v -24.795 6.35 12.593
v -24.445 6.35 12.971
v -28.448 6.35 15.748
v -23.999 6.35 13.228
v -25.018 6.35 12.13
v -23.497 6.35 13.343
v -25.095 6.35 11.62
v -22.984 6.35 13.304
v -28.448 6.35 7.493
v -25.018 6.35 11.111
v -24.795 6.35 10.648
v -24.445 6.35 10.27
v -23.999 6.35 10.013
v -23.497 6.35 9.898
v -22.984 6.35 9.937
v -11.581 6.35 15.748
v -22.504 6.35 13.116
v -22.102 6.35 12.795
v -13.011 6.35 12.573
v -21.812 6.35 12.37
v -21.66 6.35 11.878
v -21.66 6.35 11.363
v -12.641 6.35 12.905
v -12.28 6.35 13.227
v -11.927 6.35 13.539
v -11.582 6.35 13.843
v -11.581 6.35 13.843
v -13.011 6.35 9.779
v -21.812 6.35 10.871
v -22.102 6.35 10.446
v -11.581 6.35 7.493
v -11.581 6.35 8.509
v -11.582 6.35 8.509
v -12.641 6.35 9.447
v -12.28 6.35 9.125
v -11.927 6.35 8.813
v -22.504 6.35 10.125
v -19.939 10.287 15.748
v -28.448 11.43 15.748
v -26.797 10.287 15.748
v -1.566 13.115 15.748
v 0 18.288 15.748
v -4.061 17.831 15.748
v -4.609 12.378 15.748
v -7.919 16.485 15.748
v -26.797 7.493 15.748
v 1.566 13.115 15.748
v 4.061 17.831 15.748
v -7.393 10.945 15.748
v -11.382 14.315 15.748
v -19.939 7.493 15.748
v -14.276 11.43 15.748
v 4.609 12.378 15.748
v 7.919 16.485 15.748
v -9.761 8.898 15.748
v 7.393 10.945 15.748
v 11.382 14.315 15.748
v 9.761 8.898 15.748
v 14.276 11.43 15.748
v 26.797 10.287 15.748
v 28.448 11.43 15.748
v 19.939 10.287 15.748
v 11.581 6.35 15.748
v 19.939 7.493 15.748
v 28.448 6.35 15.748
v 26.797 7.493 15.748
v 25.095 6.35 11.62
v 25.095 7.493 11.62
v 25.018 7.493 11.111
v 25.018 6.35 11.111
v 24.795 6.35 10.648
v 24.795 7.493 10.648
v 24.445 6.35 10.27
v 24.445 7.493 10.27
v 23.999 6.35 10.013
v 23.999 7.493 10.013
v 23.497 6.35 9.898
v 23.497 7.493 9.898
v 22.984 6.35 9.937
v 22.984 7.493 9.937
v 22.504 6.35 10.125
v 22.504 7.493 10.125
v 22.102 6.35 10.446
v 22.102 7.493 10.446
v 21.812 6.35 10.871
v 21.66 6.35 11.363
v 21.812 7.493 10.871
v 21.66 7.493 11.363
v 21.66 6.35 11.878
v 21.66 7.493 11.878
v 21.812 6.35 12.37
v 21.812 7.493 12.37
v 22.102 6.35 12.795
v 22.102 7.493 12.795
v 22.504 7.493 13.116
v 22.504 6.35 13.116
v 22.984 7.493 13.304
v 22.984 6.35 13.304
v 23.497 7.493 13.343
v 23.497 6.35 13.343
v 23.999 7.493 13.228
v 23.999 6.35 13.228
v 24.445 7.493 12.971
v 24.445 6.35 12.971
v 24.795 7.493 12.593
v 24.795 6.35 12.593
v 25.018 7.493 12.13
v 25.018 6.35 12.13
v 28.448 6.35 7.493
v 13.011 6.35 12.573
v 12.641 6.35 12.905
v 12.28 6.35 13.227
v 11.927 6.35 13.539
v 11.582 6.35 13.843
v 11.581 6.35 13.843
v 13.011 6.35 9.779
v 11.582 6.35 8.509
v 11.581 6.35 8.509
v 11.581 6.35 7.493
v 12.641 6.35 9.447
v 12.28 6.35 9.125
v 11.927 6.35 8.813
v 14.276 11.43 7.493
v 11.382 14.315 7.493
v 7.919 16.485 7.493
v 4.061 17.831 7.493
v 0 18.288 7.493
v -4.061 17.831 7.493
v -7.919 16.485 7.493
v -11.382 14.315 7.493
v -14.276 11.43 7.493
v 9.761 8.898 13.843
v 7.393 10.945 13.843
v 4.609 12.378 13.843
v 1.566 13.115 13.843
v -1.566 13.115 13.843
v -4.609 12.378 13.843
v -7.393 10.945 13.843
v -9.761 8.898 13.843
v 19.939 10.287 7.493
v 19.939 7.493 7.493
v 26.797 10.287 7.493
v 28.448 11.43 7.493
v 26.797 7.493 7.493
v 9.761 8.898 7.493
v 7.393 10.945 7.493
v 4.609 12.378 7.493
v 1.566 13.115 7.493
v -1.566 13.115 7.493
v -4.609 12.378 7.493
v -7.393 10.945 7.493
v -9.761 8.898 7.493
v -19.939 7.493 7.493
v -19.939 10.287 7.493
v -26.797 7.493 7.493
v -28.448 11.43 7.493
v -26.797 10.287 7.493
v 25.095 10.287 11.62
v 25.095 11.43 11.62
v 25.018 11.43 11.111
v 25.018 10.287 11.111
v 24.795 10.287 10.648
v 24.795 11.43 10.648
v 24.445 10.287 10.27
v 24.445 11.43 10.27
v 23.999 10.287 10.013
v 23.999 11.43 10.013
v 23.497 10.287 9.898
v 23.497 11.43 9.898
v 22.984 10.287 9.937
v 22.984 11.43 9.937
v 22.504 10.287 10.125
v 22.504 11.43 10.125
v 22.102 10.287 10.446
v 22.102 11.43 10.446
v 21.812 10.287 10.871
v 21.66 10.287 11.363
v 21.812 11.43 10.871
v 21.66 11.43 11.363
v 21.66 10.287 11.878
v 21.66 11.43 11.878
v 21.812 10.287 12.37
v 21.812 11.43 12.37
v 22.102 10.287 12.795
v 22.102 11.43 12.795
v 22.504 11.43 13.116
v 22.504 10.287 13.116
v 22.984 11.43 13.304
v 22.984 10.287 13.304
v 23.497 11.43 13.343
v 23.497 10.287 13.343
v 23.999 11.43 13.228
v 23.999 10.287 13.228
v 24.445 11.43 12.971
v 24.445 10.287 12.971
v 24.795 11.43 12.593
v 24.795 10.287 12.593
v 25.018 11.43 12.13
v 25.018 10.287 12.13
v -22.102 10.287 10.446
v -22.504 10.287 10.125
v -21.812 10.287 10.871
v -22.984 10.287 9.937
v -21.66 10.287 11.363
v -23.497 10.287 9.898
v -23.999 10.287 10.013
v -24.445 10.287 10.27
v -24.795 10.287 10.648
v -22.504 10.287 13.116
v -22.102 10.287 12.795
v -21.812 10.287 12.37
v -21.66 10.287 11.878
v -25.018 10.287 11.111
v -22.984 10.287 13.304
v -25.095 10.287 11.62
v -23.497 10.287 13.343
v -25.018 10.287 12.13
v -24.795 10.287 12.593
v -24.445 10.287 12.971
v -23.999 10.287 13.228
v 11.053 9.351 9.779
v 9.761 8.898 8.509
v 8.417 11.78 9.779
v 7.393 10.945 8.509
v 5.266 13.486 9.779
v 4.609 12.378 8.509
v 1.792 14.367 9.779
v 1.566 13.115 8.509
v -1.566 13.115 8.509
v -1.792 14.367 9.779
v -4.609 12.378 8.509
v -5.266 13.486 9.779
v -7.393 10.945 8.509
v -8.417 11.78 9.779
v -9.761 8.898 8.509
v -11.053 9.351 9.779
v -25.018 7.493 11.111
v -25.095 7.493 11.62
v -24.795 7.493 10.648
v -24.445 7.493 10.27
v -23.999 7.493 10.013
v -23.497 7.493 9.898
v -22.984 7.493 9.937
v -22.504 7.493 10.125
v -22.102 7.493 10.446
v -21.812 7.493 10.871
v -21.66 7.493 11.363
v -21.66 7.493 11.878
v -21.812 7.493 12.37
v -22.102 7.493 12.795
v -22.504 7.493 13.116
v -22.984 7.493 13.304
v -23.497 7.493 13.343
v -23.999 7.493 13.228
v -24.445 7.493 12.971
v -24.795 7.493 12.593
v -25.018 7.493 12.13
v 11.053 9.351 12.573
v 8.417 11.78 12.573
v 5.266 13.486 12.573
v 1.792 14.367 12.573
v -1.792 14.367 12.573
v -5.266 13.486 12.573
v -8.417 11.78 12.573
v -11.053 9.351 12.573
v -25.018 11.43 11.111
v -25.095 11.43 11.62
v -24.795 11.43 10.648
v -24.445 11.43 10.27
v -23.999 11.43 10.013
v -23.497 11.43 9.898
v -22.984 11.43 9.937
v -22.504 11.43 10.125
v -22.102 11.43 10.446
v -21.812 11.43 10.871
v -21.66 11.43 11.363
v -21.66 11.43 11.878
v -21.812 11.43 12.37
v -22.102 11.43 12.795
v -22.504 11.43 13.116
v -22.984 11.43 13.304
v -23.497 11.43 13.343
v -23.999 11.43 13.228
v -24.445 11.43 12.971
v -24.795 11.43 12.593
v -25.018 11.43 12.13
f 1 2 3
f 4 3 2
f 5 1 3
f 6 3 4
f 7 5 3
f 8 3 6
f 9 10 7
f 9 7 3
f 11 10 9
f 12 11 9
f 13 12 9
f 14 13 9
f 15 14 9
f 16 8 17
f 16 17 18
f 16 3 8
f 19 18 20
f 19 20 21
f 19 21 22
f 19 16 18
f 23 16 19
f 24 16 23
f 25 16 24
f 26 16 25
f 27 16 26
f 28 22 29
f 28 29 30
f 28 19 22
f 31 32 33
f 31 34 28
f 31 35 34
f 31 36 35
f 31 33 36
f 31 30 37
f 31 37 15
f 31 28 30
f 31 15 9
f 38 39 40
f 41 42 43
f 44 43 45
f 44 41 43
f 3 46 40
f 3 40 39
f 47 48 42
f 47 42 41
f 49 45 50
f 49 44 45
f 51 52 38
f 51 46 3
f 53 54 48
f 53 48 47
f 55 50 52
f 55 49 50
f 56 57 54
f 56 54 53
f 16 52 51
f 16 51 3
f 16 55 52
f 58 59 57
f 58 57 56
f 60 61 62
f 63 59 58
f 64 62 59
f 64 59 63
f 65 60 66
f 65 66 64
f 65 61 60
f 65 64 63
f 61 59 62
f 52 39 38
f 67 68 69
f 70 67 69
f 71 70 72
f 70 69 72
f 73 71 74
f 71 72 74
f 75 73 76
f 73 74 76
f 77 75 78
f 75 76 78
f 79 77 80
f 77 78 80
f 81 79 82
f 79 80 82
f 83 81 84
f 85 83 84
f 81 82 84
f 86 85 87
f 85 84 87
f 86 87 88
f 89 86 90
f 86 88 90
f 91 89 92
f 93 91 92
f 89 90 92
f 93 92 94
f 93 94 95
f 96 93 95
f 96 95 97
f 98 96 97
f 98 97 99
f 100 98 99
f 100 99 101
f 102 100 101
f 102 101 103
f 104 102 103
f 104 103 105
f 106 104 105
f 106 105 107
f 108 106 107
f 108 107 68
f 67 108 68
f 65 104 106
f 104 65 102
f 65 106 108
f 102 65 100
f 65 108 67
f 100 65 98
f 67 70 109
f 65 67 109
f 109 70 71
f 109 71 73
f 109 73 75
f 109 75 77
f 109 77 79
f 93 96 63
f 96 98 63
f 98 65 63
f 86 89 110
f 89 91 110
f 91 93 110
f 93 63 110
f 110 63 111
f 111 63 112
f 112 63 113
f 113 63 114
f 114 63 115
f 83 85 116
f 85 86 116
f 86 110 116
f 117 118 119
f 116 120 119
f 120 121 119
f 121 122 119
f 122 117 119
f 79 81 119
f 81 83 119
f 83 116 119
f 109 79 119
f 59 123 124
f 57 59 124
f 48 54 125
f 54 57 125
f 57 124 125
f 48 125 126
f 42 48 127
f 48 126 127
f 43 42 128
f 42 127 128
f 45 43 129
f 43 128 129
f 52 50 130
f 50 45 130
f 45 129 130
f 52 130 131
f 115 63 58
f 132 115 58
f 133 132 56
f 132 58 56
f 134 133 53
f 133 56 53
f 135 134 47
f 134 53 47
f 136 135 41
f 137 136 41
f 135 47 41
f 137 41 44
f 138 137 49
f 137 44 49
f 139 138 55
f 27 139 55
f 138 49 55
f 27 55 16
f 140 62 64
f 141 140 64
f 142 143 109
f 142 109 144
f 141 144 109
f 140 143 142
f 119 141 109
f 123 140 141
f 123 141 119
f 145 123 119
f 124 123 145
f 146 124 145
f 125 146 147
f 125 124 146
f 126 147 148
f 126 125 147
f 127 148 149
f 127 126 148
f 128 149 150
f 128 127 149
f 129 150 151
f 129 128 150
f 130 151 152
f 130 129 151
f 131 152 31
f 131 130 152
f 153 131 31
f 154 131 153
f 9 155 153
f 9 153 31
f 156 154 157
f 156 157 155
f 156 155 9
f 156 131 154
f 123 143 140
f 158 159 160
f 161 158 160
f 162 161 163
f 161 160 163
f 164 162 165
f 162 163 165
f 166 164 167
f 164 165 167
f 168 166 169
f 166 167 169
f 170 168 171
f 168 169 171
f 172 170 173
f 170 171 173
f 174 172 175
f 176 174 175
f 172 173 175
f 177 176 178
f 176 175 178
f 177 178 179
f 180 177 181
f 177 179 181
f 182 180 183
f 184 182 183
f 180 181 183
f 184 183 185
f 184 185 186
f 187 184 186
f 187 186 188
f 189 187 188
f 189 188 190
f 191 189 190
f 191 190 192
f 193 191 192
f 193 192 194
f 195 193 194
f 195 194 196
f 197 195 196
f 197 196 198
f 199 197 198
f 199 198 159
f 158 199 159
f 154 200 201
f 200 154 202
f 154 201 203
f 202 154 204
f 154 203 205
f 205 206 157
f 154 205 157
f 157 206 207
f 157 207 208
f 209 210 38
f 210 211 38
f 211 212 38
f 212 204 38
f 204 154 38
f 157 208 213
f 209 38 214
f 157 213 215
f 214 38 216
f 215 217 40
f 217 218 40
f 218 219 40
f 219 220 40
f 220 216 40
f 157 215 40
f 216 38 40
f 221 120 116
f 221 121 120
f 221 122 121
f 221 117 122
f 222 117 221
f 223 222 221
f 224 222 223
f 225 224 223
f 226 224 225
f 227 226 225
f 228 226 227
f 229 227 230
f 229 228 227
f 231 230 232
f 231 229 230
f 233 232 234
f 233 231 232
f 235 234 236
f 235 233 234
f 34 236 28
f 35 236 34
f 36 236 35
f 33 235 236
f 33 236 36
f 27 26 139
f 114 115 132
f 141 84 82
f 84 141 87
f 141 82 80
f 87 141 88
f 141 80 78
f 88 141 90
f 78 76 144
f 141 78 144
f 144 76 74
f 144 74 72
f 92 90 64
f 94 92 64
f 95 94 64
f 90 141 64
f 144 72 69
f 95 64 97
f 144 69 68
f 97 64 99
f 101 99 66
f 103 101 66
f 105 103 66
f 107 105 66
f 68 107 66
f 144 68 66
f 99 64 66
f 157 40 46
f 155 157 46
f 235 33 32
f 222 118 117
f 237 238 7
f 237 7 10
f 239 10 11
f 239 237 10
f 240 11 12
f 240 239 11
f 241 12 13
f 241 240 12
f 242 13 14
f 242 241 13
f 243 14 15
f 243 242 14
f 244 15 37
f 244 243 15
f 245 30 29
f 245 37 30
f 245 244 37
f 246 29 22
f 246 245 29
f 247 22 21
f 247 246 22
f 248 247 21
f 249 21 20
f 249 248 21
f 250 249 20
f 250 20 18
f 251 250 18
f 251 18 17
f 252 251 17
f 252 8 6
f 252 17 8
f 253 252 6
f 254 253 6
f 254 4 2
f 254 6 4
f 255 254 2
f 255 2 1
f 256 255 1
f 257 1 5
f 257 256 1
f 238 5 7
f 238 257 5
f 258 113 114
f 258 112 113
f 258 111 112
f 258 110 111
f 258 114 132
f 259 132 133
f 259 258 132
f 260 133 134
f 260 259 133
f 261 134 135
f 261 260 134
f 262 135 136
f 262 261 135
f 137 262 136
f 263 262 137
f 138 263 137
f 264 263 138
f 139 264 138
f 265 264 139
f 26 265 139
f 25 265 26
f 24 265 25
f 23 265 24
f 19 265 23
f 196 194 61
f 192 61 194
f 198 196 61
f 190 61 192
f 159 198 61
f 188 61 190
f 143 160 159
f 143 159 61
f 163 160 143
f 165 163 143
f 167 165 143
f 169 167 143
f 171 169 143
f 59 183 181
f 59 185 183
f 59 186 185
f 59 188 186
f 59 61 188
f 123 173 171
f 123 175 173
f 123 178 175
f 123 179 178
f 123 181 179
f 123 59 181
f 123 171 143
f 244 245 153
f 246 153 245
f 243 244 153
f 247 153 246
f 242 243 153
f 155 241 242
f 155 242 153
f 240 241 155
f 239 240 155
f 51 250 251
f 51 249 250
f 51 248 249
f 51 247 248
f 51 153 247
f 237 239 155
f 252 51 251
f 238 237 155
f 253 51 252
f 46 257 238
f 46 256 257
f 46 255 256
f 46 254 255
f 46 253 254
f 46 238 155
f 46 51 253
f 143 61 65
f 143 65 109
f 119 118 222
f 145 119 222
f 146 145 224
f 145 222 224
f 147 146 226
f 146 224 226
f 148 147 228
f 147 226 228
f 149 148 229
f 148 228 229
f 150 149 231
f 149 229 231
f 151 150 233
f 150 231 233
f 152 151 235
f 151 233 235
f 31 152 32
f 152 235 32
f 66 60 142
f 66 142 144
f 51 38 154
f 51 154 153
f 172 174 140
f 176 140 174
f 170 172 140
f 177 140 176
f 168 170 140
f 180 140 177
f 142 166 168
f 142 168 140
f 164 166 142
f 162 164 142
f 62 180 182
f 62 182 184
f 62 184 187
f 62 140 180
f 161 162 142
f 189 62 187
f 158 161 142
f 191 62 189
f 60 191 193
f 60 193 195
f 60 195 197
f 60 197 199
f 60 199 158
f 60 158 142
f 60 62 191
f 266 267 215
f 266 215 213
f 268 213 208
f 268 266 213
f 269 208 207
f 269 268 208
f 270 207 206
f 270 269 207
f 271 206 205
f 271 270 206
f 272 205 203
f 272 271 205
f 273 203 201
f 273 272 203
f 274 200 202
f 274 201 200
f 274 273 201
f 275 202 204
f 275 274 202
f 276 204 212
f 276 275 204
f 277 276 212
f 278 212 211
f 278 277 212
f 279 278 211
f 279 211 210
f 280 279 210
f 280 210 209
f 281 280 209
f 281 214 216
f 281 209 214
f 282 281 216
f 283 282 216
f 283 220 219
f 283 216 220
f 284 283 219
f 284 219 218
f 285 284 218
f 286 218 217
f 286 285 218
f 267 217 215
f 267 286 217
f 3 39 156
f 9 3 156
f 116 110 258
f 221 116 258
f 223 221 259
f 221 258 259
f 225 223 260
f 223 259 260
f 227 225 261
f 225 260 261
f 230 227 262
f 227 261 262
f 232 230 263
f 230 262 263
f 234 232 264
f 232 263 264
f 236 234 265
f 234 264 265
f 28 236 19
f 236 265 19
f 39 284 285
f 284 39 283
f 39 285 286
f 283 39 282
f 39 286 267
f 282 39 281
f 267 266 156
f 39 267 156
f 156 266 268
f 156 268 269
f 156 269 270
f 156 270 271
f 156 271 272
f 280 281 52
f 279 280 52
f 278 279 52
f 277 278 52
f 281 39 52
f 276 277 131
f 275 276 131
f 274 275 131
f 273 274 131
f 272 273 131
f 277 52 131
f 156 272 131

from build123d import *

# Parameters (mm, degrees)
SKETCH1_R                   = 18.288
BOSS_EXTRUDE1_DEPTH         = 19.05
SKETCH3_R                   = 13.208
CUT_EXTRUDE1_DEPTH          = 33.121712096
SKETCH15_W                  = 19.05
SKETCH15_H                  = 17.526
BOSS_EXTRUDE3_DEPTH         = 15.24
SKETCH16_W                  = 11.43
SKETCH16_H                  = 5.842
CUT_EXTRUDE4_DEPTH          = 39.82462909
CHAMFER1_SIZE               = 8.129699408
CHAMFER1_SIZE_2             = 5.08
F_1_4_CLEARANCE_HOLE1_D     = 6.7564
F_1_4_CLEARANCE_HOLE1_DEPTH = 3.448428068
SKETCH19_R                  = 18.288
SKETCH19_R_2                = 13.208
CUT_EXTRUDE5_DEPTH          = 0.762
CUT_EXTRUDE6_START          = -2.54
SKETCH20_R                  = 18.288
CUT_EXTRUDE6_DEPTH          = 2.54
SKETCH21_R                  = 18.288
CUT_EXTRUDE7_DEPTH          = 7.493
SKETCH22_W                  = 19.05
SKETCH22_H                  = 4.191
CUT_EXTRUDE8_DEPTH          = 42.148
SKETCH24_R                  = 14.478
CUT_EXTRUDE10_DEPTH         = 5.334
SKETCH25_W                  = 8.255
SKETCH25_H                  = 5.08
BOSS_EXTRUDE4_DEPTH         = 15.24
F_4_CLEARANCE_HOLE1_D       = 3.4544
SKETCH28_W                  = 6.858
SKETCH28_H                  = 2.794
CUT_EXTRUDE11_DEPTH         = 43.003222079
MIRROR3_COPY_1_SKETCH_W     = 6.858
MIRROR3_COPY_1_SKETCH_H     = 2.794
MIRROR3_COPY_1_DEPTH        = 43.003222079
SKETCH29_W                  = 78.170578527
SKETCH29_H                  = 29.425688311
CUT_EXTRUDE12_DEPTH         = 35.306
CHAMFER2_SIZE               = 1.27


# Some blends are built 0.0001 mm under size
with BuildPart() as part:
    # Sketch1 → Boss-Extrude1 (new body)
    with BuildSketch(Plane.XY):
        with Locations(Location((0, 0, 0), (0, 0, 180))):
            Circle(SKETCH1_R)
    extrude(amount=BOSS_EXTRUDE1_DEPTH)

    # Sketch3 → Cut-Extrude1 (cut, through all)
    with BuildSketch(Plane.XY.offset(19.05)):
        Circle(SKETCH3_R)
    extrude(amount=-CUT_EXTRUDE1_DEPTH, mode=Mode.SUBTRACT)

    # Sketch15 → Boss-Extrude3 (add)
    with BuildSketch(Plane(origin=(0, -13.716, 0), x_dir=(1, 0, 0), z_dir=(0, 1, 0))):
        with Locations((0, -9.525)):
            Rectangle(SKETCH15_W, SKETCH15_H)
    extrude(amount=-BOSS_EXTRUDE3_DEPTH)

    # Sketch16 → Cut-Extrude4 (cut, through all)
    with BuildSketch(Plane.XY.offset(18.288)):
        with Locations((0, -22.586571932)):
            Rectangle(SKETCH16_W, SKETCH16_H)
    extrude(amount=-CUT_EXTRUDE4_DEPTH, mode=Mode.SUBTRACT)

    # Chamfer1
    # the kernel refuses this chamfer: 8.129699408, 5.08 mm, written as the material it takes off along each edge
    with BuildSketch(Plane(origin=(-30.543101737, -28.956, 0.762), x_dir=(0, 0.9997899140358644, -0.020497019104217945), z_dir=(1, 0, 0))) as chamfer1_piece_1:
        Polygon((CHAMFER1_SIZE * 0.999789913978, CHAMFER1_SIZE * 0.020497019103), (-CHAMFER1_SIZE_2 * 0.0204970191042, CHAMFER1_SIZE_2 * 0.999789914036), (0, 0), align=None)
    extrude(amount=61.086203475, mode=Mode.SUBTRACT)

    # 1/4 Clearance Hole1
    with Locations(Plane(origin=(0, -28.956, 0), x_dir=(-1, 0, 0), z_dir=(0, -1, 0))):
        with Locations((0, -12.021417661)):
            Hole(F_1_4_CLEARANCE_HOLE1_D / 2, depth=F_1_4_CLEARANCE_HOLE1_DEPTH)

    # Sketch19 → Cut-Extrude5 (cut)
    with BuildSketch(Plane.XY.offset(19.05)):
        with Locations(Location((0, 0, 0), (0, 0, 238.611833536))):
            Circle(SKETCH19_R)
        Circle(SKETCH19_R_2, mode=Mode.SUBTRACT)
    extrude(amount=-CUT_EXTRUDE5_DEPTH, mode=Mode.SUBTRACT)

    # Sketch20 → Cut-Extrude6 (cut)
    with BuildSketch(Plane.XY.offset(18.288).offset(CUT_EXTRUDE6_START)):
        with Locations(Location((0, 0, 0), (0, 0, 238.611833536))):
            Circle(SKETCH20_R)
    extrude(amount=CUT_EXTRUDE6_DEPTH, mode=Mode.SUBTRACT)

    # Sketch21 → Cut-Extrude7 (cut)
    with BuildSketch(Plane(origin=(0, 0, 0), x_dir=(-1, 0, 0), z_dir=(0, 0, -1))):
        Circle(SKETCH21_R)
    extrude(amount=-CUT_EXTRUDE7_DEPTH, mode=Mode.SUBTRACT)

    # Sketch22 → Cut-Extrude8 (cut, through all)
    with BuildSketch(Plane(origin=(0, -13.716, 0), x_dir=(1, 0, 0), z_dir=(0, 1, 0))):
        with Locations((0, -2.8575)):
            Rectangle(SKETCH22_W, SKETCH22_H)
    extrude(amount=-CUT_EXTRUDE8_DEPTH, mode=Mode.SUBTRACT)

    # Sketch24 → Cut-Extrude10 (cut)
    with BuildSketch(Plane.XY.offset(13.843)):
        Circle(SKETCH24_R)
    extrude(amount=-CUT_EXTRUDE10_DEPTH, mode=Mode.SUBTRACT)

    # Sketch25 → Boss-Extrude4 (add)
    with BuildSketch(Plane(origin=(13.208, 0, 0), x_dir=(0, 0, -1), z_dir=(1, 0, 0))):
        with Locations((-11.6205, 8.89)):
            Rectangle(SKETCH25_W, SKETCH25_H)
        with Locations((-11.6205, -8.89)):
            Rectangle(SKETCH25_W, SKETCH25_H)
    boss_extrude4 = extrude(amount=BOSS_EXTRUDE4_DEPTH)

    # #4 Clearance Hole1 (through all)
    with Locations(Plane(origin=(0, -11.43, 0), x_dir=(-1, 0, 0), z_dir=(0, -1, 0))):
        with Locations((-23.368, -11.6205)):
            f_4_clearance_hole1 = Hole(F_4_CLEARANCE_HOLE1_D / 2)

    # Sketch28 → Cut-Extrude11 (cut, through all)
    with BuildSketch(Plane.XY.offset(15.748)):
        with Locations((23.368, -8.89)):
            Rectangle(SKETCH28_W, SKETCH28_H)
    cut_extrude11 = extrude(amount=-CUT_EXTRUDE11_DEPTH, mode=Mode.SUBTRACT)

    # Mirror2: Cut-Extrude11 across plane
    add(cut_extrude11.mirror(Plane.ZX), mode=Mode.SUBTRACT)

    # Mirror3: Boss-Extrude4, #4 Clearance Hole1, Cut-Extrude11 across plane
    add(boss_extrude4.mirror(Plane(origin=(0, 0, 0), x_dir=(0, 0, 1), z_dir=(1, 0, 0))))
    add(f_4_clearance_hole1.mirror(Plane(origin=(0, 0, 0), x_dir=(0, 0, 1), z_dir=(1, 0, 0))), mode=Mode.SUBTRACT)
    add(cut_extrude11.mirror(Plane(origin=(0, 0, 0), x_dir=(0, 0, 1), z_dir=(1, 0, 0))), mode=Mode.SUBTRACT)

    # Mirror3 copy 1 sketch → Mirror3 copy 1 (cut, through all)
    with BuildSketch(Plane(origin=(0, 0, 15.748), x_dir=(-1, 0, 0), z_dir=(0, 0, 1))):
        with Locations((23.368, -8.89)):
            Rectangle(MIRROR3_COPY_1_SKETCH_W, MIRROR3_COPY_1_SKETCH_H)
    extrude(amount=-MIRROR3_COPY_1_DEPTH, mode=Mode.SUBTRACT)

    # Sketch29 → Cut-Extrude12 (cut)
    with BuildSketch(Plane.XZ.offset(28.956)):
        with Locations((-0.790643495, 9.076690496)):
            Rectangle(SKETCH29_W, SKETCH29_H)
    extrude(amount=-CUT_EXTRUDE12_DEPTH, mode=Mode.SUBTRACT)

    # Chamfer2
    chamfer2_edges = [part.edges().sort_by_distance(p)[0] for p in [
        (0, 14.478, 8.509),
        (0, 14.478, 13.843),
    ]]
    chamfer(chamfer2_edges, length=CHAMFER2_SIZE - 0.0001)  # a hair under: the kernel refuses the full size


solid = part.part
